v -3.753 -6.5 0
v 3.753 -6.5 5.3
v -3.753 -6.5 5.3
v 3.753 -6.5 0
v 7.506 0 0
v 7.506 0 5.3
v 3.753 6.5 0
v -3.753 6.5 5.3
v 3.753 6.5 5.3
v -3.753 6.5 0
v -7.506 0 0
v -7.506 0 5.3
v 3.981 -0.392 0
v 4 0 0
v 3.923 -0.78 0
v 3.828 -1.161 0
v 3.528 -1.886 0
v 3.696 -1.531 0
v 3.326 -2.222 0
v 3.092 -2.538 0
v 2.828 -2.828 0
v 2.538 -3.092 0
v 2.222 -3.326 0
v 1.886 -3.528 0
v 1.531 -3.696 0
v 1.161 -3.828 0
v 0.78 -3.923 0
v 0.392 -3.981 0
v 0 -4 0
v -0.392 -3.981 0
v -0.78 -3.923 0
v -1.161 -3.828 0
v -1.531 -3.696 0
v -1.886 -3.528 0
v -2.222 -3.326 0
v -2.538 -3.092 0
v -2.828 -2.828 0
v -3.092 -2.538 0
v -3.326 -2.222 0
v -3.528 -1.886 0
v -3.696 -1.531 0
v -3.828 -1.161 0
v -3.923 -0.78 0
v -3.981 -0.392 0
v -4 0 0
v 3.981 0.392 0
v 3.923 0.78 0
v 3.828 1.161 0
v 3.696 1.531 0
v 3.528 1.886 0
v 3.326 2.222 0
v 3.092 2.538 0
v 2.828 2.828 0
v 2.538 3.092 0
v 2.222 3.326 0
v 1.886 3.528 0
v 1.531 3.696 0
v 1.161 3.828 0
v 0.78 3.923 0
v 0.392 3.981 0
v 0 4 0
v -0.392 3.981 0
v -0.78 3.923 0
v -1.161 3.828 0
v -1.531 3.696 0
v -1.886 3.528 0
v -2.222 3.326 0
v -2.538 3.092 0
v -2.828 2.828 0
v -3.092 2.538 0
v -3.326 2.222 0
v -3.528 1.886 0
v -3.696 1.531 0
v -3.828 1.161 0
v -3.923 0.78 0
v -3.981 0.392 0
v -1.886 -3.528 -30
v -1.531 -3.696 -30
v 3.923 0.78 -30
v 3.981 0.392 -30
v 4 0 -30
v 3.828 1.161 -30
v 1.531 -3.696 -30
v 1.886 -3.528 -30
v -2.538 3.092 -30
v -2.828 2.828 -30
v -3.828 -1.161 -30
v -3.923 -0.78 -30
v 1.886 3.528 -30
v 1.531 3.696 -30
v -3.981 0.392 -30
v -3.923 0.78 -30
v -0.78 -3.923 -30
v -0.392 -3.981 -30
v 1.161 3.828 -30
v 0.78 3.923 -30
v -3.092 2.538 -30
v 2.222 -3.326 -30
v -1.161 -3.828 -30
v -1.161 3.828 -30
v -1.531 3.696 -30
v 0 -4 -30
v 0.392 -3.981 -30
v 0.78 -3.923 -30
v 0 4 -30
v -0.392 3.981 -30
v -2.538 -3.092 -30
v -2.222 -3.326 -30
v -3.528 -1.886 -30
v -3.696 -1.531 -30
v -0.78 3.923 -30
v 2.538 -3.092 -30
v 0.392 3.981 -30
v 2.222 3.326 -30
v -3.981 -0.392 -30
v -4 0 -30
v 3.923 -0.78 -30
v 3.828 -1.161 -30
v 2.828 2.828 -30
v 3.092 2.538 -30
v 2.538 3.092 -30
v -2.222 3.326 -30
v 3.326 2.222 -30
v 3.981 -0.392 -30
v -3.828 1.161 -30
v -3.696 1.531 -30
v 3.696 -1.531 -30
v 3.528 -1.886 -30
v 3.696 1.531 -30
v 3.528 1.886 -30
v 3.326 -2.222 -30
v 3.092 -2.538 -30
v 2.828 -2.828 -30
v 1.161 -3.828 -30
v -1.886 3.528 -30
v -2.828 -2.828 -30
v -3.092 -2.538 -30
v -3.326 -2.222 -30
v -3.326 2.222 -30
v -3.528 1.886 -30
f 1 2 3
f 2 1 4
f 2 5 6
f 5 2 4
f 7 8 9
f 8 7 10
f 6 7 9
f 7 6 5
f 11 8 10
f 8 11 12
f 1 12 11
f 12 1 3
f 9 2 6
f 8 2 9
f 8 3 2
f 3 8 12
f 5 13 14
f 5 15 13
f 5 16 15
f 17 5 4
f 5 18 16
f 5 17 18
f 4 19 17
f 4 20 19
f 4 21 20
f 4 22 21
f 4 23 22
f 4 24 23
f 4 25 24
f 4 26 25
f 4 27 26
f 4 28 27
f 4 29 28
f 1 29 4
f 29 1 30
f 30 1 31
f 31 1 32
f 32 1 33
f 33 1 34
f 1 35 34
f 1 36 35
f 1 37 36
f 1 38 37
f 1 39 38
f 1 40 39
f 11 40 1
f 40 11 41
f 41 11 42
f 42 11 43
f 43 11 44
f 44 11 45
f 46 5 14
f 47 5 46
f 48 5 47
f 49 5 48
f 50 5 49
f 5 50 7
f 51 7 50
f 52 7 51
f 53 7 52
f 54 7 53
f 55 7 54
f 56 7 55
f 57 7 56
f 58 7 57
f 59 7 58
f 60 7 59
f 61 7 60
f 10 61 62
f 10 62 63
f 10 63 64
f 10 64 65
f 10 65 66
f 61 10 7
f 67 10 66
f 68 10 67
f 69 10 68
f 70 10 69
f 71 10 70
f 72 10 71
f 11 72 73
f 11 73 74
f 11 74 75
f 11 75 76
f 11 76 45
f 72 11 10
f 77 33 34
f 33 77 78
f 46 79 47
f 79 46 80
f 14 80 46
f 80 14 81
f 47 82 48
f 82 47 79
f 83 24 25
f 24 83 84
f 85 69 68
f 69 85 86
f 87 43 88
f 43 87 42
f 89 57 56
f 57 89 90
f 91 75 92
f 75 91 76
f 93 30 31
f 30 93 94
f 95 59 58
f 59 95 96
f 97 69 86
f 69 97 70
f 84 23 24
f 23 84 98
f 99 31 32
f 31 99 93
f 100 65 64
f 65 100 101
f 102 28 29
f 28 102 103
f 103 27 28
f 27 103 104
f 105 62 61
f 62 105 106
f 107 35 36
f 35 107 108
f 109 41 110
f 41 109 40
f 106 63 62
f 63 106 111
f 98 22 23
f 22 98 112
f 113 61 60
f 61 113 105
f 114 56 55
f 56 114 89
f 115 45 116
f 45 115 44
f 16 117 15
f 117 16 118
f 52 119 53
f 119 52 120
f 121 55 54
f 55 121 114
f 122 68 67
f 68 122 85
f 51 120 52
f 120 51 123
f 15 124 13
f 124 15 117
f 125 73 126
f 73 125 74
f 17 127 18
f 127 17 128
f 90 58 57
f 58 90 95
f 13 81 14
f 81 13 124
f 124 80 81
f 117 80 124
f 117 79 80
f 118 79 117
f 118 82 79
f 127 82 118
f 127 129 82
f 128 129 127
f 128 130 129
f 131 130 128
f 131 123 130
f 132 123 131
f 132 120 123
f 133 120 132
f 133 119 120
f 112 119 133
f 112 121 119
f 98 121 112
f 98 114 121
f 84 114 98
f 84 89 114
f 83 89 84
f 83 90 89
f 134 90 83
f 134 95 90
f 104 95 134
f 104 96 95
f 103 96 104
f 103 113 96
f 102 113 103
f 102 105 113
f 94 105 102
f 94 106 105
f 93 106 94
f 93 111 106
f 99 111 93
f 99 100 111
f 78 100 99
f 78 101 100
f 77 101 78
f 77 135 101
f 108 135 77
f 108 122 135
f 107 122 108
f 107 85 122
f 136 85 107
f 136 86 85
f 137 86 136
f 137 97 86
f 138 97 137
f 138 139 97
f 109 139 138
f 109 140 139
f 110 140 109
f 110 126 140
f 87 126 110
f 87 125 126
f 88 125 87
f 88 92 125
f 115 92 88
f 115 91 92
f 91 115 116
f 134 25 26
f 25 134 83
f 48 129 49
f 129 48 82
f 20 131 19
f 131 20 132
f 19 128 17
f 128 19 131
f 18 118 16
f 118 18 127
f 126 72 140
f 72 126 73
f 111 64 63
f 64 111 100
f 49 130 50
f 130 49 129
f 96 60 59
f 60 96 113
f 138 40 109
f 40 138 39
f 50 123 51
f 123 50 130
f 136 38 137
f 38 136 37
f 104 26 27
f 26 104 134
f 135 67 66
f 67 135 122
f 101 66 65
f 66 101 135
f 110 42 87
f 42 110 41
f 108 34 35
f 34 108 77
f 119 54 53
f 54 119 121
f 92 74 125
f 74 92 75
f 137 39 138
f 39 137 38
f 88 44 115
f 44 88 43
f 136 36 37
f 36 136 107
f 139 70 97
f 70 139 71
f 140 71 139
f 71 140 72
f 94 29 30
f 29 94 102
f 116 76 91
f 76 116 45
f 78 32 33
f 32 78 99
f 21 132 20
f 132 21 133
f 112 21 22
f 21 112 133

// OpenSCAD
AF = 13;
head_height = 5.3;
shank_length = 30;
shank_diameter = 8;

module hex_bolt() {
    union() {
        cylinder(h = head_height, r = AF / (2 * cos(30)), $fn = 6);
        translate([0, 0, -shank_length])
            cylinder(h = shank_length, r = shank_diameter / 2, $fn = 64);
    }
}

hex_bolt();
